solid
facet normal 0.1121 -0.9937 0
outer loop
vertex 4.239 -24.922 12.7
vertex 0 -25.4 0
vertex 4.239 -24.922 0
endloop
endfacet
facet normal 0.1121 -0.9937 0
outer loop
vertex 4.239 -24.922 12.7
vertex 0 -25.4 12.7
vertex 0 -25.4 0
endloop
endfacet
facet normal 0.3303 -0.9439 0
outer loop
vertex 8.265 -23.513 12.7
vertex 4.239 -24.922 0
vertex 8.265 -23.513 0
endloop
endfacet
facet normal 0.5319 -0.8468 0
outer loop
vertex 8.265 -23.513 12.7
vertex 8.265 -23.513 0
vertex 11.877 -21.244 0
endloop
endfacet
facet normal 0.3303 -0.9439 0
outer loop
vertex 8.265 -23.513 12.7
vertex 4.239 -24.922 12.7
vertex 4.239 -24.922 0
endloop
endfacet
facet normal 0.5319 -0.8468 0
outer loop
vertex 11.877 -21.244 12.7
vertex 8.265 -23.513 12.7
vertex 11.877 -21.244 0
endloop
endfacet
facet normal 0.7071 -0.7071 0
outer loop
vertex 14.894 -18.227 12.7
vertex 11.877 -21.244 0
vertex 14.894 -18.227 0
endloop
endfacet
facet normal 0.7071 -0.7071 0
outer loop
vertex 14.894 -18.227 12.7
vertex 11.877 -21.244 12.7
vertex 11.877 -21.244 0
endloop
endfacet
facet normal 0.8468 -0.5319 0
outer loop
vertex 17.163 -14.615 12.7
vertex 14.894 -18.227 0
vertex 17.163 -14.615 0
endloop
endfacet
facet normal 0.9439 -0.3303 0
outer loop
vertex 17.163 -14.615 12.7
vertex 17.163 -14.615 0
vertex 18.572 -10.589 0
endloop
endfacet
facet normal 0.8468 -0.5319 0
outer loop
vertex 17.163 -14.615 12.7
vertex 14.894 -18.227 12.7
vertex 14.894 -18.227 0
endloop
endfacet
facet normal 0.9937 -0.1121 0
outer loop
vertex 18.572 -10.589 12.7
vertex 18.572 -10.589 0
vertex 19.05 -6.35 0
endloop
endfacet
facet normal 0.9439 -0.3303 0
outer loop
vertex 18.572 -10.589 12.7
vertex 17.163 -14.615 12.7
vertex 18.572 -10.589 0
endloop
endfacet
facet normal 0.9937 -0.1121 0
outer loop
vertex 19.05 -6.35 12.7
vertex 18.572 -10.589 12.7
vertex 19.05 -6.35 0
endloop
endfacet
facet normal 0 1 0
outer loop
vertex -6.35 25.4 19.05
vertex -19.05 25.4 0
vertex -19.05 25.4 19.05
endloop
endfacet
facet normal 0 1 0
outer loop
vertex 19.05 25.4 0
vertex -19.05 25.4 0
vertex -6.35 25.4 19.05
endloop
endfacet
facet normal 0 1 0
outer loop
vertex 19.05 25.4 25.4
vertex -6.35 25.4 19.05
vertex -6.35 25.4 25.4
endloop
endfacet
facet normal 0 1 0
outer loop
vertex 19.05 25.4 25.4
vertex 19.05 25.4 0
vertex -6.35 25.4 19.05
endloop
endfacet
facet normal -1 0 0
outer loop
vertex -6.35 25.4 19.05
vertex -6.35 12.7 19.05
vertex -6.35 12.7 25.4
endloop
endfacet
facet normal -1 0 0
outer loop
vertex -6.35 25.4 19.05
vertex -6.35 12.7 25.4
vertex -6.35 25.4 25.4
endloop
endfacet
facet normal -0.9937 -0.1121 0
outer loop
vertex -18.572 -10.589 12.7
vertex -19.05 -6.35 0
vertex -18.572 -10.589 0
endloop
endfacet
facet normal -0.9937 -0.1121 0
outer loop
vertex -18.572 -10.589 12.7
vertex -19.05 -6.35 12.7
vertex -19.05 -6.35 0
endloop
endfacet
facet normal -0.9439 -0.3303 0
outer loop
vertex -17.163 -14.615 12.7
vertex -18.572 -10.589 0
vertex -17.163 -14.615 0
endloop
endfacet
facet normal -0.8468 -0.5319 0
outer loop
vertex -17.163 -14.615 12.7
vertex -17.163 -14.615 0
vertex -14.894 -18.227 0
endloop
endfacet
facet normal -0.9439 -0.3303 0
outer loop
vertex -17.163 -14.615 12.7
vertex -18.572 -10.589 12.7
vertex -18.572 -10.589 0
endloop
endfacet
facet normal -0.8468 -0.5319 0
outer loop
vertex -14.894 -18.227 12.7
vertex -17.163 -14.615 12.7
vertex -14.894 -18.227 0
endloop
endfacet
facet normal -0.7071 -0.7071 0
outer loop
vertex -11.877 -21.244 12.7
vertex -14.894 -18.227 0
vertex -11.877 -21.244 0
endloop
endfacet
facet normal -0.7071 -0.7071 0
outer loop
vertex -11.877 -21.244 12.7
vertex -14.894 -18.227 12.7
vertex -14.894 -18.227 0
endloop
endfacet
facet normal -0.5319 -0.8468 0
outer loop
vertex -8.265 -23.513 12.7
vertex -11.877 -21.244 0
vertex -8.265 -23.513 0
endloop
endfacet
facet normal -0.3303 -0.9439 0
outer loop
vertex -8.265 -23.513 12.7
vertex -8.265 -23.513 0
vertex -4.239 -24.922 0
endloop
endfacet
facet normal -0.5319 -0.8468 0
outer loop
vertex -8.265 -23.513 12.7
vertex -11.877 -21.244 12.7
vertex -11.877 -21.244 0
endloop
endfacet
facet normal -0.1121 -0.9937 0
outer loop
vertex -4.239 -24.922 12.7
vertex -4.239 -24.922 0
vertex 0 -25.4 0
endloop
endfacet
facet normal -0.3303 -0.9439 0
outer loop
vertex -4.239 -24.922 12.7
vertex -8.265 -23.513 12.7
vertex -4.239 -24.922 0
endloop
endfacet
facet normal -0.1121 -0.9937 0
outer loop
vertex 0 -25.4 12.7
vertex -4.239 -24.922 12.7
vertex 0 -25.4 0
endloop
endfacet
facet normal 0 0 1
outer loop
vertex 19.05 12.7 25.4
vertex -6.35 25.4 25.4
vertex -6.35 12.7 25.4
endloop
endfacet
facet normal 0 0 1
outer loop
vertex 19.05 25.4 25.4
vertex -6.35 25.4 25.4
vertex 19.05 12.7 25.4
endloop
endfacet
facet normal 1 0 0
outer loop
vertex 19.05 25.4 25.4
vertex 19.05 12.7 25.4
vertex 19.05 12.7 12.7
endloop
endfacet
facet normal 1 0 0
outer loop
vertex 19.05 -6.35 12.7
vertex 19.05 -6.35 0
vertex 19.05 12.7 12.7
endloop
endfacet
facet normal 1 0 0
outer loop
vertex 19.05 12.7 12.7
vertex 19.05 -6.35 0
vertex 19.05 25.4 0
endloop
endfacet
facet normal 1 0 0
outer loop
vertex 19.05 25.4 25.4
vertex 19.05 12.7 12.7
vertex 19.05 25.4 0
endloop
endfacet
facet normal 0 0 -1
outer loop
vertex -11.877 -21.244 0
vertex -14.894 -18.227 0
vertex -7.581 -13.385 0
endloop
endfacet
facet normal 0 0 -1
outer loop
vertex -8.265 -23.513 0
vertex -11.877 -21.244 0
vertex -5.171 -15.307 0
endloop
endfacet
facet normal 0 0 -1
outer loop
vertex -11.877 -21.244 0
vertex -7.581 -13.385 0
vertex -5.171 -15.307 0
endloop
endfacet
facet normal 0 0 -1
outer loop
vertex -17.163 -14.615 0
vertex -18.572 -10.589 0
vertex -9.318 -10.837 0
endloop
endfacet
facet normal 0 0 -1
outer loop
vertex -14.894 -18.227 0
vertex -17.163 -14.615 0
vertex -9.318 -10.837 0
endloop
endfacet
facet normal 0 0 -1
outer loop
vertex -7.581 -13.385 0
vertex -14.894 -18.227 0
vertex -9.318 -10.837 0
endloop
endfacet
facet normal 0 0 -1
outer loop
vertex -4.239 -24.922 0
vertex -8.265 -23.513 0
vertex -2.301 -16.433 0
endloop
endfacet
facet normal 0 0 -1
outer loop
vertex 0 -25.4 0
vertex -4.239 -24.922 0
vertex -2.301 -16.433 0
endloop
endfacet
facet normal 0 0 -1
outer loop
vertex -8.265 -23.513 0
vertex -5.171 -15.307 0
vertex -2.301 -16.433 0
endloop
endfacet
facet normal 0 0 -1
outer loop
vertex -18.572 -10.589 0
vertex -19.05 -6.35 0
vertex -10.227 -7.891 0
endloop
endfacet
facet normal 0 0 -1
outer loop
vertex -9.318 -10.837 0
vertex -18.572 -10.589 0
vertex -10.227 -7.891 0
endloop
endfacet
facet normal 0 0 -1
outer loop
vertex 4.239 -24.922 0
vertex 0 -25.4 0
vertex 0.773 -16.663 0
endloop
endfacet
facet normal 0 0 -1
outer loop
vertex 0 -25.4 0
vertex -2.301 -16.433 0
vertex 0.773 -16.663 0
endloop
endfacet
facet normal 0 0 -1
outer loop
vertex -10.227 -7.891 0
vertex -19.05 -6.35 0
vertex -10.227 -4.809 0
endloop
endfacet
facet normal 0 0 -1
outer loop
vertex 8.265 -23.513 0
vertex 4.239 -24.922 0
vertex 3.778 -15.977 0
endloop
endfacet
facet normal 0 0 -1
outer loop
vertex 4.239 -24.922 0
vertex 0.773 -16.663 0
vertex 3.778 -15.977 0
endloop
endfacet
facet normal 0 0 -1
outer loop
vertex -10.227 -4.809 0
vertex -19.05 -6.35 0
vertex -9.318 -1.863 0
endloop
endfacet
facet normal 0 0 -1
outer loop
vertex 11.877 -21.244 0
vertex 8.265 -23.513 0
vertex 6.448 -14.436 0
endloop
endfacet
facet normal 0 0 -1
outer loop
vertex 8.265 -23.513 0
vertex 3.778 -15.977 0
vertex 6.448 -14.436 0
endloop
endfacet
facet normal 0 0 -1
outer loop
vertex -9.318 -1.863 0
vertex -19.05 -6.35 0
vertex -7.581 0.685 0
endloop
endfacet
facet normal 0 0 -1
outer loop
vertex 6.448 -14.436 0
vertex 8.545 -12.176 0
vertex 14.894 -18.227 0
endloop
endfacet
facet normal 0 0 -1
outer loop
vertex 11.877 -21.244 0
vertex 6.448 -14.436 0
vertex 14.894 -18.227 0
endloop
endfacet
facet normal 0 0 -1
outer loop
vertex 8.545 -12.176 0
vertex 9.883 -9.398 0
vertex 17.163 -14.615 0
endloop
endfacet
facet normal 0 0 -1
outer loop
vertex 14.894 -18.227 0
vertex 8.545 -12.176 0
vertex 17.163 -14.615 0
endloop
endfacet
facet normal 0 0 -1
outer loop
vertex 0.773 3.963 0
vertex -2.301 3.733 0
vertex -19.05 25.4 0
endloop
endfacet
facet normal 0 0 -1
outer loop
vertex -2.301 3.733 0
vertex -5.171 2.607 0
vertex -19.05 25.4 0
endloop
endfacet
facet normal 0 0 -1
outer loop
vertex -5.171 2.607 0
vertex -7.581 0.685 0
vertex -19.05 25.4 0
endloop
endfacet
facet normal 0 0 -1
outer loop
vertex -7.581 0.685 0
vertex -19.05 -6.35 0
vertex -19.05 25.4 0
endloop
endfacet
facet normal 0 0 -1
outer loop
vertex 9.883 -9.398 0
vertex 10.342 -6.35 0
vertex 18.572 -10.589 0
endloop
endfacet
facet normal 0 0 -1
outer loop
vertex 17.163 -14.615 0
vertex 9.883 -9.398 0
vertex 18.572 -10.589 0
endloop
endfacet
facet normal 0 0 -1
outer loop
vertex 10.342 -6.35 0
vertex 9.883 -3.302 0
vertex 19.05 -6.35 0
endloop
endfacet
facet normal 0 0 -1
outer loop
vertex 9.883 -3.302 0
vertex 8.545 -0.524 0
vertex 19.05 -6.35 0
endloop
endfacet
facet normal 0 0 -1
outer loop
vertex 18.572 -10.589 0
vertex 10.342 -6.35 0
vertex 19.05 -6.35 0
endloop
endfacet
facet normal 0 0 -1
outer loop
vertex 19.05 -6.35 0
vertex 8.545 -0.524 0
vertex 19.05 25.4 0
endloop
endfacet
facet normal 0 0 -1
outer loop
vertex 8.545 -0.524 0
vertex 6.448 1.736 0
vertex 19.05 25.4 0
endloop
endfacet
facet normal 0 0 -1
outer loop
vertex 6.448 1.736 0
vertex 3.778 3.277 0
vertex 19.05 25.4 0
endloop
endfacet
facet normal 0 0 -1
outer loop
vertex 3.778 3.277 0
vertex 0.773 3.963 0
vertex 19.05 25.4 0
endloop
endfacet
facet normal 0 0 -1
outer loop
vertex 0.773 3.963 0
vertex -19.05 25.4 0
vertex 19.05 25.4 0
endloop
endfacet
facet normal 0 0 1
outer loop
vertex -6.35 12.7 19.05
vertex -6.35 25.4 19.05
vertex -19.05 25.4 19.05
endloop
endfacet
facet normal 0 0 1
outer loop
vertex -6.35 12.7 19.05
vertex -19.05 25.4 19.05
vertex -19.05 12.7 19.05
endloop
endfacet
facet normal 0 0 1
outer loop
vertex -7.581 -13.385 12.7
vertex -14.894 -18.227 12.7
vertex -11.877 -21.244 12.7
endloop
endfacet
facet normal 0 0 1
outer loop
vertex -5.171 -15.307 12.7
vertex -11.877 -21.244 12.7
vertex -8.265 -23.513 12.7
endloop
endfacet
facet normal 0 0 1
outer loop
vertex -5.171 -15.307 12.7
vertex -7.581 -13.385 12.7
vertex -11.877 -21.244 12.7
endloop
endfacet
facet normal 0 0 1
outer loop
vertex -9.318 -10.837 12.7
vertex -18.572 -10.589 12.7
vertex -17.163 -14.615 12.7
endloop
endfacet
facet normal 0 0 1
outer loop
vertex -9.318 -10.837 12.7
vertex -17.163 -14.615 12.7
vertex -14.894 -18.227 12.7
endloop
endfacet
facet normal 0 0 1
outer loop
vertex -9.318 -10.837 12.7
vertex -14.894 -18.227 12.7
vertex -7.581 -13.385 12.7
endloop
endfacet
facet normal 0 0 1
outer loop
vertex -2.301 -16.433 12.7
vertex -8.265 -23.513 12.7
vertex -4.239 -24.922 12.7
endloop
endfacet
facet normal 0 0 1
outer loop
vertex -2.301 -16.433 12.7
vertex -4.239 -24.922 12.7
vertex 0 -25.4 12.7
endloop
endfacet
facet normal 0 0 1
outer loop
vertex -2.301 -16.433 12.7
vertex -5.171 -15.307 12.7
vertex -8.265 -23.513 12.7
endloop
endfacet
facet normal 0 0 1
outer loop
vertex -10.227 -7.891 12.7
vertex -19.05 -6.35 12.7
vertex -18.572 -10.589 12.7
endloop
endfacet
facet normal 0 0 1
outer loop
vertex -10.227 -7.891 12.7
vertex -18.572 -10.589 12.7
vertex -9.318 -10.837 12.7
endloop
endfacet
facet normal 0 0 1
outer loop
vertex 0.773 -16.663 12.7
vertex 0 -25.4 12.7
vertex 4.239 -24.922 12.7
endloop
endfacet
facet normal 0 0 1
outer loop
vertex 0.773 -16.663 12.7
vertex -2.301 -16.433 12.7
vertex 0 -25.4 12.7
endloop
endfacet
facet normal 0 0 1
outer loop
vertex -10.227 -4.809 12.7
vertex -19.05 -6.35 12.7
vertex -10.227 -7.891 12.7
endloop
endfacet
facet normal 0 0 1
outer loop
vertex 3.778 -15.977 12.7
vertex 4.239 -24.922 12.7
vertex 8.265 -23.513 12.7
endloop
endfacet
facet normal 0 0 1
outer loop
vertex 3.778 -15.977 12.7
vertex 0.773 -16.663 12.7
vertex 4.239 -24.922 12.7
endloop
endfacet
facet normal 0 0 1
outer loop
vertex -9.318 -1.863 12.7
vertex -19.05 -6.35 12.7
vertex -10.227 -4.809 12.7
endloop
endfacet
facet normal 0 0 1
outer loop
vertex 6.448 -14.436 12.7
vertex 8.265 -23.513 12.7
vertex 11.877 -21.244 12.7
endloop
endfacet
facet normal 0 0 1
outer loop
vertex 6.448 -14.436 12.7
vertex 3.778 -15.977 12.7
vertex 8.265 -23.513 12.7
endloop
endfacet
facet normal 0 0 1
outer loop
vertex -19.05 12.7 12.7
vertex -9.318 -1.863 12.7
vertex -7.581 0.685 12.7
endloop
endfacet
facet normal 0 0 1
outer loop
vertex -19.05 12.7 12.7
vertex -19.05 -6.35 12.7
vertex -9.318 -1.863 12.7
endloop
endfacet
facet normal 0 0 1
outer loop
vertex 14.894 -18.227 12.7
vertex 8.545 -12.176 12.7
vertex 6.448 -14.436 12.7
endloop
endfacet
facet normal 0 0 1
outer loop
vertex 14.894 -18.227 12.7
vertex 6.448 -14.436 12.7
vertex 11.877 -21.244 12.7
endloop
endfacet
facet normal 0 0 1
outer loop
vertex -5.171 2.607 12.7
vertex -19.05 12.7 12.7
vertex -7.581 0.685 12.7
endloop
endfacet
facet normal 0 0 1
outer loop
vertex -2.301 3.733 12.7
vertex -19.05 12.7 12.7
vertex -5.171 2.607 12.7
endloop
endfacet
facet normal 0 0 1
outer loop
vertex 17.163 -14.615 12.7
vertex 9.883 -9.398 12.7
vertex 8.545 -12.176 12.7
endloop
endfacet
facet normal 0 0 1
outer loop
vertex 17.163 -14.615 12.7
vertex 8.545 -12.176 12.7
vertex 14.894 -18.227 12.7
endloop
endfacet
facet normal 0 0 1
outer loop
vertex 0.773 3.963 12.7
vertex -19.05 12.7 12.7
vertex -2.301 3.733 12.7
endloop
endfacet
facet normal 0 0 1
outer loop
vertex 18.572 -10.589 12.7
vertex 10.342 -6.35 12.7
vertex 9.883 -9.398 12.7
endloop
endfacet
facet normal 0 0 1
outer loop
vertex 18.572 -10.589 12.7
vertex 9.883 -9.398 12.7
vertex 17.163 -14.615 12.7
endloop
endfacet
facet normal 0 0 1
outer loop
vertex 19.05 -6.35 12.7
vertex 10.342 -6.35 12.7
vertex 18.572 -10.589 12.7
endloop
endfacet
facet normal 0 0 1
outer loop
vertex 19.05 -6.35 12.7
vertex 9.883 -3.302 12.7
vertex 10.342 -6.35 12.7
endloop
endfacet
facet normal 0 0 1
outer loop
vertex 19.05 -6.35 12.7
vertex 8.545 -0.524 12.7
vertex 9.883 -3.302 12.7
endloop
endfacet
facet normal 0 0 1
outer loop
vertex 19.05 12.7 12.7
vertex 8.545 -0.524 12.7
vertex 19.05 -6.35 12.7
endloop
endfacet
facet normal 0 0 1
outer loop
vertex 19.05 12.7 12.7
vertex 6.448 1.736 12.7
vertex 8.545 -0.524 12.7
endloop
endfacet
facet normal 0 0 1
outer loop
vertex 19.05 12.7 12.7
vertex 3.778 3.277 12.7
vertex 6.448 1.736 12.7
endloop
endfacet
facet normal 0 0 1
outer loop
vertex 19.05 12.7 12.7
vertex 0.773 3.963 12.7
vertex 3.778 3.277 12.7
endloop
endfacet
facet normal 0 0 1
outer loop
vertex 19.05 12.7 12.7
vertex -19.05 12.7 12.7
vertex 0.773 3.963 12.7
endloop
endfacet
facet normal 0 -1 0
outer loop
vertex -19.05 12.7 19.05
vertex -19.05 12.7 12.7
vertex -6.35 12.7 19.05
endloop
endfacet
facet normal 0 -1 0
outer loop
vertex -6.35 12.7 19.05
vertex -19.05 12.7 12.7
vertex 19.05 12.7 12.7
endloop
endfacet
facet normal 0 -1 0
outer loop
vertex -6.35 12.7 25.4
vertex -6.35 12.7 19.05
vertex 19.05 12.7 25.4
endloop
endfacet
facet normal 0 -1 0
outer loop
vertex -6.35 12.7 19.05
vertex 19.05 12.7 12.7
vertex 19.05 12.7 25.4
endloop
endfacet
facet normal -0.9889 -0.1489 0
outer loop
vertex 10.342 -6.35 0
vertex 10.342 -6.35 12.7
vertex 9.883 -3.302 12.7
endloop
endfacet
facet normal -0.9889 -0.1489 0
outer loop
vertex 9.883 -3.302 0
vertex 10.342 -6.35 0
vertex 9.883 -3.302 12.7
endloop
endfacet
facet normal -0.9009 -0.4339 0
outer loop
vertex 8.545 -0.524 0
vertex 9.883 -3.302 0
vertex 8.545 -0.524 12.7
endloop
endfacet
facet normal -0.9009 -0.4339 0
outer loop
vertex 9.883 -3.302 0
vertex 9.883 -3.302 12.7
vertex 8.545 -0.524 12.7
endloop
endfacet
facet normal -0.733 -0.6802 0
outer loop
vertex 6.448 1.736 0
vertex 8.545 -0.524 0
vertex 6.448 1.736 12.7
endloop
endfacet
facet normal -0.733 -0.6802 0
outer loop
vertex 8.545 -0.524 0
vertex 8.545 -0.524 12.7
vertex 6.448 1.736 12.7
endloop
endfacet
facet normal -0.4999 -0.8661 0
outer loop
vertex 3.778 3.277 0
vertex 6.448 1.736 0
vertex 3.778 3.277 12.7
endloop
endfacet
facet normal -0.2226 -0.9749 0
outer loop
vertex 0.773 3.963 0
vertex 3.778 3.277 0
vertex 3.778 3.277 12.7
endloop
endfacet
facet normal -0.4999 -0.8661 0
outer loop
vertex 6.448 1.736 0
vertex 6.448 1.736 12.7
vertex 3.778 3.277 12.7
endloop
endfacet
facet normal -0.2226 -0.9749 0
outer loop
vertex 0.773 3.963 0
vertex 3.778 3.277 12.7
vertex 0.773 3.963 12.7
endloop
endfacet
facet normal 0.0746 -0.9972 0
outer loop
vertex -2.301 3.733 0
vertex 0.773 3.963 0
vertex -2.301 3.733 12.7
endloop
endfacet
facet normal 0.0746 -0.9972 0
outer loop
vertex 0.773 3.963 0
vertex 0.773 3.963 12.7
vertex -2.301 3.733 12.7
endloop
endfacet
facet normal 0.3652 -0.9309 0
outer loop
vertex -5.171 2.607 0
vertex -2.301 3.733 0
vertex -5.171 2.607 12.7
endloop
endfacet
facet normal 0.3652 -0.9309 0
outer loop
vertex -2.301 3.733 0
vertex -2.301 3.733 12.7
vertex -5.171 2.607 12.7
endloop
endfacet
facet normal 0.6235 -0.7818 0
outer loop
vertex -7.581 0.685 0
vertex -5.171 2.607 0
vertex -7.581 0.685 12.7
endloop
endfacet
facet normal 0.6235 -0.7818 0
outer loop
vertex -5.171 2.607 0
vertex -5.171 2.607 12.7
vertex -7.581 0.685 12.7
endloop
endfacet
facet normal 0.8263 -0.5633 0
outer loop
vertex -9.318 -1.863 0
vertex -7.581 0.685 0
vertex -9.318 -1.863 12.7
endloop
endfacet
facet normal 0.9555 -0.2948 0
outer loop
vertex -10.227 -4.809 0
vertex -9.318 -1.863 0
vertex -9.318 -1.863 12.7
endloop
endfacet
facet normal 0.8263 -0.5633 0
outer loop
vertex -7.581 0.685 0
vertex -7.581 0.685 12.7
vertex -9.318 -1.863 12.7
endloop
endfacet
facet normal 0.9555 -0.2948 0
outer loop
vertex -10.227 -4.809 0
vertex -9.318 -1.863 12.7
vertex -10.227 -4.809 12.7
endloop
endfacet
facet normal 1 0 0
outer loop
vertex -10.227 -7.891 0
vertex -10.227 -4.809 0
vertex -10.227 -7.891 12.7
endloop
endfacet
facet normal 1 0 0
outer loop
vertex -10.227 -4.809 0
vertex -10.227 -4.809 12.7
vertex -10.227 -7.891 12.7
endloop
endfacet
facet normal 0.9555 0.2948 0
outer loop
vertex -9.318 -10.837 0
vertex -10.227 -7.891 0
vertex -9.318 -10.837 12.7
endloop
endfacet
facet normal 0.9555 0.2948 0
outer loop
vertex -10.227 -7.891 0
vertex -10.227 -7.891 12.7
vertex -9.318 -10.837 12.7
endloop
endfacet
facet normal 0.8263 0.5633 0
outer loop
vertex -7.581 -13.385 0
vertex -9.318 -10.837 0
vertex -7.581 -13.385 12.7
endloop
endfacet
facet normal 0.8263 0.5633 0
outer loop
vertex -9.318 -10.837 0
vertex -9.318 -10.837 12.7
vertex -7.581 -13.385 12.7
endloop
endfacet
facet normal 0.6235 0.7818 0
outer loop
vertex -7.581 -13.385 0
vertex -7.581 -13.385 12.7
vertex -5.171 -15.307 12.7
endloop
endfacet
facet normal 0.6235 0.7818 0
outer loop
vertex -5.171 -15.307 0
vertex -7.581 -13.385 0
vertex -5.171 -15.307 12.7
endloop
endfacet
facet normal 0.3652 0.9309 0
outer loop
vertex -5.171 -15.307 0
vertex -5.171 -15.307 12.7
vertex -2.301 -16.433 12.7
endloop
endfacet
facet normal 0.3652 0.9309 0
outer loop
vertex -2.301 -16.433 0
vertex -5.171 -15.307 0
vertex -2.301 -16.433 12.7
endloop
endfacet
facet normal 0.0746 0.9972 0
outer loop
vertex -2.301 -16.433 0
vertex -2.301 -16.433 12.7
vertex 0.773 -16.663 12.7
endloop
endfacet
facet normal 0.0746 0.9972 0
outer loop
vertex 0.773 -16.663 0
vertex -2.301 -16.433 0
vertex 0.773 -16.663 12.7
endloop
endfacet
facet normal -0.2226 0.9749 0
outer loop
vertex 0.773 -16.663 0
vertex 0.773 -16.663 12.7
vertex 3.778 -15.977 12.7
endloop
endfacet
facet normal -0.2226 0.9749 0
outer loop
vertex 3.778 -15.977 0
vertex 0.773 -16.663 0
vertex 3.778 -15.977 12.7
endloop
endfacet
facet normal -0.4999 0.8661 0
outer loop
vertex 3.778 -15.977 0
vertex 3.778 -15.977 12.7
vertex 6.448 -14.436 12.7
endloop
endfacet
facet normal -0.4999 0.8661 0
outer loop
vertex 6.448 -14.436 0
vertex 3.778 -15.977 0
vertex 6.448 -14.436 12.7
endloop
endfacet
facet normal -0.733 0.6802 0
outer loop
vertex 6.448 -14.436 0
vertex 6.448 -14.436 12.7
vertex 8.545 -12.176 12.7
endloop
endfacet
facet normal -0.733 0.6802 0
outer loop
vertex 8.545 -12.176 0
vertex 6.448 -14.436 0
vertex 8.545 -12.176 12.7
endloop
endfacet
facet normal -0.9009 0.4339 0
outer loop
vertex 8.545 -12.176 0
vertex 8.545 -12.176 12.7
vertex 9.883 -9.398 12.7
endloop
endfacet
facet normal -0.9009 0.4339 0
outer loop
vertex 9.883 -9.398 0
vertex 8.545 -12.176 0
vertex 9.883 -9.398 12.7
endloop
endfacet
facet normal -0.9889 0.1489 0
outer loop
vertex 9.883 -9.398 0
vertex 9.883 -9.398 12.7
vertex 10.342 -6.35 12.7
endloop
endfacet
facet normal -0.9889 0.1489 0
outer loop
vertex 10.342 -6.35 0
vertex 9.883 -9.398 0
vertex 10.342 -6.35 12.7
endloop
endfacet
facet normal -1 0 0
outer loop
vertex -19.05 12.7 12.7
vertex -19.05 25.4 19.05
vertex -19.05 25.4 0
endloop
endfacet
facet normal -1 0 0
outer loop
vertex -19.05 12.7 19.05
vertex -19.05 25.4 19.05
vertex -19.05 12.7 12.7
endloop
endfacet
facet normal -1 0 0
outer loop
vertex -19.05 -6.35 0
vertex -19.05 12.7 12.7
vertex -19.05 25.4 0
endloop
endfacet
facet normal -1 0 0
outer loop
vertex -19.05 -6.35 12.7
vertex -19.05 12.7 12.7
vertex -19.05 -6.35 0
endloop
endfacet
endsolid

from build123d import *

# Parameters (mm, degrees)
F1_W     = 25.4
F1_H     = 12.7
F2_DEPTH = 25.4
F0_W     = 38.1
F0_H     = 50.8
F3_DEPTH = 12.7
F4_R     = 10.3422808599
F5_DEPTH = 12.701
F6_R     = 19.04999
F7_W     = 12.7
F7_H     = 6.35
F8_DEPTH = 12.7


# Not quite as in the source:
# - a fillet or chamfer is up to 0.001 mm smaller than in the source, because OpenCascade refuses the exact size


with BuildPart() as f2:
    # F1 (on face) → F2 (new body)
    with BuildSketch(Plane.XY):
        with Locations((6.35, 19.05)):
            Rectangle(F1_W, F1_H)
    extrude(amount=F2_DEPTH)

    # F0 (on Top) → F3 (join)
    with BuildSketch(Plane.XY):
        Rectangle(F0_W, F0_H)
    extrude(amount=F3_DEPTH)

    # F4 (on face) → F5 (cut, through all)
    with BuildSketch(Plane.XY.offset(12.7)):
        with Locations((0, -6.35)):
            Circle(F4_R)
    extrude(amount=-F5_DEPTH, mode=Mode.SUBTRACT)

    # F6 (radius 19.05 in the source; OpenCascade refuses exactly that, so slightly less here)
    f6_edges = [f2.edges().sort_by_distance(p)[0] for p in [
        (-19.05, -25.4, 6.35),
        (19.05, -25.4, 6.35),
    ]]
    fillet(f6_edges, radius=F6_R)

    # F7 (on face) → F8 (join)
    with BuildSketch(Plane(origin=(-6.35, 0, 0), x_dir=(0, -1, 0), z_dir=(-1, 0, 0))):
        with Locations((-19.05, 15.875)):
            Rectangle(F7_W, F7_H)
    extrude(amount=F8_DEPTH)


solid = f2.part
